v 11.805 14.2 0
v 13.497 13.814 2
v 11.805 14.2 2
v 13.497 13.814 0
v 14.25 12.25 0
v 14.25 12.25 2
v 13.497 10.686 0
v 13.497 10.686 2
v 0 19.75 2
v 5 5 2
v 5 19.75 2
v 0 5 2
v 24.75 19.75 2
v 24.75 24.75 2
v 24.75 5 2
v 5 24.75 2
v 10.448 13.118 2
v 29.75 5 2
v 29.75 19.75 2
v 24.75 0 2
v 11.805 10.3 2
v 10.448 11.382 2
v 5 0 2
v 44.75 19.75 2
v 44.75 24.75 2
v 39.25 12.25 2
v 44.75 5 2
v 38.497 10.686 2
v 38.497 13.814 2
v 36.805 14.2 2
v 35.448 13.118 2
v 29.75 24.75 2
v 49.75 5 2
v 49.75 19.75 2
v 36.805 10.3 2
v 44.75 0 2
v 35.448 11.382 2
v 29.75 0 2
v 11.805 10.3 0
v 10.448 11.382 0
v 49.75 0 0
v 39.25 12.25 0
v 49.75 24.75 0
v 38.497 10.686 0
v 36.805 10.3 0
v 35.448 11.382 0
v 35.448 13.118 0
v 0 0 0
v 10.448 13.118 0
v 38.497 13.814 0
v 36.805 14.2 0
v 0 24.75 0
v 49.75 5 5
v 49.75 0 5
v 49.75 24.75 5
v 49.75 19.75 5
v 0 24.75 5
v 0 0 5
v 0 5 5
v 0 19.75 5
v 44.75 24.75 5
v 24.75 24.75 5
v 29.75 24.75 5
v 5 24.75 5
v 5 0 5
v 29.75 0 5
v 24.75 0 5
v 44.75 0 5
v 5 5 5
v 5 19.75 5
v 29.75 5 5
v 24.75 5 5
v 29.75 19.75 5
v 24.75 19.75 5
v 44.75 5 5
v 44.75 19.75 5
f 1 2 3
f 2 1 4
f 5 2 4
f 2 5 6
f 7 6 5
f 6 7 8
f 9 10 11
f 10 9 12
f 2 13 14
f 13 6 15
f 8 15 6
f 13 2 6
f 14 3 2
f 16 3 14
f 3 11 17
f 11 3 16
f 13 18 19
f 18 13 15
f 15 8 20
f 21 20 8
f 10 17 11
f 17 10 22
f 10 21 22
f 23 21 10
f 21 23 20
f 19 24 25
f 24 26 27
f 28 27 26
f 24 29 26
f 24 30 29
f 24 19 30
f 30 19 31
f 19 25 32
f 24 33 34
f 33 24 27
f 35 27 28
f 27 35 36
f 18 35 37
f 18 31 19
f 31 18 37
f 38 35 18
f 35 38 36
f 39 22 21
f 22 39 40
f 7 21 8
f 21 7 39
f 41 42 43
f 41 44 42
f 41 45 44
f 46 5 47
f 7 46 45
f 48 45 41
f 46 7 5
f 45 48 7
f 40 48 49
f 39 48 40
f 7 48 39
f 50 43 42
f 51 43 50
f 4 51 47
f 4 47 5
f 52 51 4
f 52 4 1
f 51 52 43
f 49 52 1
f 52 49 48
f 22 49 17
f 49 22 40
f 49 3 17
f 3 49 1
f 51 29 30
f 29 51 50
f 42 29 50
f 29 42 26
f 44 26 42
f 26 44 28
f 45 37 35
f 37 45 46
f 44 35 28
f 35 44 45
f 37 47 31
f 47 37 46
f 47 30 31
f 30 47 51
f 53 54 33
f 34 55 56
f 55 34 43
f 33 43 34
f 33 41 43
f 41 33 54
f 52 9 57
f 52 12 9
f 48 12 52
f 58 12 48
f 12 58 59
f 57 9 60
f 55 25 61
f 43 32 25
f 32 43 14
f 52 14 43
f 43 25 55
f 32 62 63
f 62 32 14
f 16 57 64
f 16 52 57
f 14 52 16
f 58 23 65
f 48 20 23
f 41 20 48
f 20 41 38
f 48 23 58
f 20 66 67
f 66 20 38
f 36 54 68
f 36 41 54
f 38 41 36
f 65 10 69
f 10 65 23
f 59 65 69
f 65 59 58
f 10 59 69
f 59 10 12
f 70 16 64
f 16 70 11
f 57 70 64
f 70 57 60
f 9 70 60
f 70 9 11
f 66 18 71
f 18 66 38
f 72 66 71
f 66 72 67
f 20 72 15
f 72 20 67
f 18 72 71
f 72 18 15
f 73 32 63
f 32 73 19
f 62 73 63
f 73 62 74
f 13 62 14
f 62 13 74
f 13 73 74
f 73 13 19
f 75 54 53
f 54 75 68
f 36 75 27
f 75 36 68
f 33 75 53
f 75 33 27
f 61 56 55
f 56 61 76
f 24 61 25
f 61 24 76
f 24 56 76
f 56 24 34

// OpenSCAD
item_unit = 25;
screw_width = 4;

width_count       = 2;    // Number of items X
height_count      = 1;    // Number of items Y

tolerance         = 0.25; // 3D printing tolerance per side, mm
thickness         = 2;    // Thickness of base, mm

screw_head_height = 3;    // Height of the screw head, mm
leg_size          = 5;    // Leg size, mm

module plotLegs(x, y) {
    function calcX(x_index) = (x_index == x ? x_index * item_unit - tolerance - leg_size : max(0, x_index * item_unit - tolerance));
    function calcY(y_index) = (y_index == y ? y_index * item_unit - tolerance - leg_size : max(0, y_index * item_unit - tolerance));

    for (x_index = [0 : x]) {
        for (y_index = [0 : y]) {
            translate([calcX(x_index), calcY(y_index), thickness]) {
                cube(size = [leg_size, leg_size, screw_head_height]);
            }
        }
    }
}

union() {
    difference() {
        cube(size = [item_unit * width_count - tolerance, item_unit * height_count - tolerance, thickness]);
        for (x_index = [0 : width_count - 1]) {
            for (y_index = [0 : height_count - 1]) {
                translate([x_index * item_unit + item_unit / 2 - tolerance, y_index * item_unit + item_unit / 2 - tolerance, 0]) {
                    cylinder(r = screw_width / 2, h = thickness);
                }
            }
        }
    }

    plotLegs(width_count, height_count);
}
